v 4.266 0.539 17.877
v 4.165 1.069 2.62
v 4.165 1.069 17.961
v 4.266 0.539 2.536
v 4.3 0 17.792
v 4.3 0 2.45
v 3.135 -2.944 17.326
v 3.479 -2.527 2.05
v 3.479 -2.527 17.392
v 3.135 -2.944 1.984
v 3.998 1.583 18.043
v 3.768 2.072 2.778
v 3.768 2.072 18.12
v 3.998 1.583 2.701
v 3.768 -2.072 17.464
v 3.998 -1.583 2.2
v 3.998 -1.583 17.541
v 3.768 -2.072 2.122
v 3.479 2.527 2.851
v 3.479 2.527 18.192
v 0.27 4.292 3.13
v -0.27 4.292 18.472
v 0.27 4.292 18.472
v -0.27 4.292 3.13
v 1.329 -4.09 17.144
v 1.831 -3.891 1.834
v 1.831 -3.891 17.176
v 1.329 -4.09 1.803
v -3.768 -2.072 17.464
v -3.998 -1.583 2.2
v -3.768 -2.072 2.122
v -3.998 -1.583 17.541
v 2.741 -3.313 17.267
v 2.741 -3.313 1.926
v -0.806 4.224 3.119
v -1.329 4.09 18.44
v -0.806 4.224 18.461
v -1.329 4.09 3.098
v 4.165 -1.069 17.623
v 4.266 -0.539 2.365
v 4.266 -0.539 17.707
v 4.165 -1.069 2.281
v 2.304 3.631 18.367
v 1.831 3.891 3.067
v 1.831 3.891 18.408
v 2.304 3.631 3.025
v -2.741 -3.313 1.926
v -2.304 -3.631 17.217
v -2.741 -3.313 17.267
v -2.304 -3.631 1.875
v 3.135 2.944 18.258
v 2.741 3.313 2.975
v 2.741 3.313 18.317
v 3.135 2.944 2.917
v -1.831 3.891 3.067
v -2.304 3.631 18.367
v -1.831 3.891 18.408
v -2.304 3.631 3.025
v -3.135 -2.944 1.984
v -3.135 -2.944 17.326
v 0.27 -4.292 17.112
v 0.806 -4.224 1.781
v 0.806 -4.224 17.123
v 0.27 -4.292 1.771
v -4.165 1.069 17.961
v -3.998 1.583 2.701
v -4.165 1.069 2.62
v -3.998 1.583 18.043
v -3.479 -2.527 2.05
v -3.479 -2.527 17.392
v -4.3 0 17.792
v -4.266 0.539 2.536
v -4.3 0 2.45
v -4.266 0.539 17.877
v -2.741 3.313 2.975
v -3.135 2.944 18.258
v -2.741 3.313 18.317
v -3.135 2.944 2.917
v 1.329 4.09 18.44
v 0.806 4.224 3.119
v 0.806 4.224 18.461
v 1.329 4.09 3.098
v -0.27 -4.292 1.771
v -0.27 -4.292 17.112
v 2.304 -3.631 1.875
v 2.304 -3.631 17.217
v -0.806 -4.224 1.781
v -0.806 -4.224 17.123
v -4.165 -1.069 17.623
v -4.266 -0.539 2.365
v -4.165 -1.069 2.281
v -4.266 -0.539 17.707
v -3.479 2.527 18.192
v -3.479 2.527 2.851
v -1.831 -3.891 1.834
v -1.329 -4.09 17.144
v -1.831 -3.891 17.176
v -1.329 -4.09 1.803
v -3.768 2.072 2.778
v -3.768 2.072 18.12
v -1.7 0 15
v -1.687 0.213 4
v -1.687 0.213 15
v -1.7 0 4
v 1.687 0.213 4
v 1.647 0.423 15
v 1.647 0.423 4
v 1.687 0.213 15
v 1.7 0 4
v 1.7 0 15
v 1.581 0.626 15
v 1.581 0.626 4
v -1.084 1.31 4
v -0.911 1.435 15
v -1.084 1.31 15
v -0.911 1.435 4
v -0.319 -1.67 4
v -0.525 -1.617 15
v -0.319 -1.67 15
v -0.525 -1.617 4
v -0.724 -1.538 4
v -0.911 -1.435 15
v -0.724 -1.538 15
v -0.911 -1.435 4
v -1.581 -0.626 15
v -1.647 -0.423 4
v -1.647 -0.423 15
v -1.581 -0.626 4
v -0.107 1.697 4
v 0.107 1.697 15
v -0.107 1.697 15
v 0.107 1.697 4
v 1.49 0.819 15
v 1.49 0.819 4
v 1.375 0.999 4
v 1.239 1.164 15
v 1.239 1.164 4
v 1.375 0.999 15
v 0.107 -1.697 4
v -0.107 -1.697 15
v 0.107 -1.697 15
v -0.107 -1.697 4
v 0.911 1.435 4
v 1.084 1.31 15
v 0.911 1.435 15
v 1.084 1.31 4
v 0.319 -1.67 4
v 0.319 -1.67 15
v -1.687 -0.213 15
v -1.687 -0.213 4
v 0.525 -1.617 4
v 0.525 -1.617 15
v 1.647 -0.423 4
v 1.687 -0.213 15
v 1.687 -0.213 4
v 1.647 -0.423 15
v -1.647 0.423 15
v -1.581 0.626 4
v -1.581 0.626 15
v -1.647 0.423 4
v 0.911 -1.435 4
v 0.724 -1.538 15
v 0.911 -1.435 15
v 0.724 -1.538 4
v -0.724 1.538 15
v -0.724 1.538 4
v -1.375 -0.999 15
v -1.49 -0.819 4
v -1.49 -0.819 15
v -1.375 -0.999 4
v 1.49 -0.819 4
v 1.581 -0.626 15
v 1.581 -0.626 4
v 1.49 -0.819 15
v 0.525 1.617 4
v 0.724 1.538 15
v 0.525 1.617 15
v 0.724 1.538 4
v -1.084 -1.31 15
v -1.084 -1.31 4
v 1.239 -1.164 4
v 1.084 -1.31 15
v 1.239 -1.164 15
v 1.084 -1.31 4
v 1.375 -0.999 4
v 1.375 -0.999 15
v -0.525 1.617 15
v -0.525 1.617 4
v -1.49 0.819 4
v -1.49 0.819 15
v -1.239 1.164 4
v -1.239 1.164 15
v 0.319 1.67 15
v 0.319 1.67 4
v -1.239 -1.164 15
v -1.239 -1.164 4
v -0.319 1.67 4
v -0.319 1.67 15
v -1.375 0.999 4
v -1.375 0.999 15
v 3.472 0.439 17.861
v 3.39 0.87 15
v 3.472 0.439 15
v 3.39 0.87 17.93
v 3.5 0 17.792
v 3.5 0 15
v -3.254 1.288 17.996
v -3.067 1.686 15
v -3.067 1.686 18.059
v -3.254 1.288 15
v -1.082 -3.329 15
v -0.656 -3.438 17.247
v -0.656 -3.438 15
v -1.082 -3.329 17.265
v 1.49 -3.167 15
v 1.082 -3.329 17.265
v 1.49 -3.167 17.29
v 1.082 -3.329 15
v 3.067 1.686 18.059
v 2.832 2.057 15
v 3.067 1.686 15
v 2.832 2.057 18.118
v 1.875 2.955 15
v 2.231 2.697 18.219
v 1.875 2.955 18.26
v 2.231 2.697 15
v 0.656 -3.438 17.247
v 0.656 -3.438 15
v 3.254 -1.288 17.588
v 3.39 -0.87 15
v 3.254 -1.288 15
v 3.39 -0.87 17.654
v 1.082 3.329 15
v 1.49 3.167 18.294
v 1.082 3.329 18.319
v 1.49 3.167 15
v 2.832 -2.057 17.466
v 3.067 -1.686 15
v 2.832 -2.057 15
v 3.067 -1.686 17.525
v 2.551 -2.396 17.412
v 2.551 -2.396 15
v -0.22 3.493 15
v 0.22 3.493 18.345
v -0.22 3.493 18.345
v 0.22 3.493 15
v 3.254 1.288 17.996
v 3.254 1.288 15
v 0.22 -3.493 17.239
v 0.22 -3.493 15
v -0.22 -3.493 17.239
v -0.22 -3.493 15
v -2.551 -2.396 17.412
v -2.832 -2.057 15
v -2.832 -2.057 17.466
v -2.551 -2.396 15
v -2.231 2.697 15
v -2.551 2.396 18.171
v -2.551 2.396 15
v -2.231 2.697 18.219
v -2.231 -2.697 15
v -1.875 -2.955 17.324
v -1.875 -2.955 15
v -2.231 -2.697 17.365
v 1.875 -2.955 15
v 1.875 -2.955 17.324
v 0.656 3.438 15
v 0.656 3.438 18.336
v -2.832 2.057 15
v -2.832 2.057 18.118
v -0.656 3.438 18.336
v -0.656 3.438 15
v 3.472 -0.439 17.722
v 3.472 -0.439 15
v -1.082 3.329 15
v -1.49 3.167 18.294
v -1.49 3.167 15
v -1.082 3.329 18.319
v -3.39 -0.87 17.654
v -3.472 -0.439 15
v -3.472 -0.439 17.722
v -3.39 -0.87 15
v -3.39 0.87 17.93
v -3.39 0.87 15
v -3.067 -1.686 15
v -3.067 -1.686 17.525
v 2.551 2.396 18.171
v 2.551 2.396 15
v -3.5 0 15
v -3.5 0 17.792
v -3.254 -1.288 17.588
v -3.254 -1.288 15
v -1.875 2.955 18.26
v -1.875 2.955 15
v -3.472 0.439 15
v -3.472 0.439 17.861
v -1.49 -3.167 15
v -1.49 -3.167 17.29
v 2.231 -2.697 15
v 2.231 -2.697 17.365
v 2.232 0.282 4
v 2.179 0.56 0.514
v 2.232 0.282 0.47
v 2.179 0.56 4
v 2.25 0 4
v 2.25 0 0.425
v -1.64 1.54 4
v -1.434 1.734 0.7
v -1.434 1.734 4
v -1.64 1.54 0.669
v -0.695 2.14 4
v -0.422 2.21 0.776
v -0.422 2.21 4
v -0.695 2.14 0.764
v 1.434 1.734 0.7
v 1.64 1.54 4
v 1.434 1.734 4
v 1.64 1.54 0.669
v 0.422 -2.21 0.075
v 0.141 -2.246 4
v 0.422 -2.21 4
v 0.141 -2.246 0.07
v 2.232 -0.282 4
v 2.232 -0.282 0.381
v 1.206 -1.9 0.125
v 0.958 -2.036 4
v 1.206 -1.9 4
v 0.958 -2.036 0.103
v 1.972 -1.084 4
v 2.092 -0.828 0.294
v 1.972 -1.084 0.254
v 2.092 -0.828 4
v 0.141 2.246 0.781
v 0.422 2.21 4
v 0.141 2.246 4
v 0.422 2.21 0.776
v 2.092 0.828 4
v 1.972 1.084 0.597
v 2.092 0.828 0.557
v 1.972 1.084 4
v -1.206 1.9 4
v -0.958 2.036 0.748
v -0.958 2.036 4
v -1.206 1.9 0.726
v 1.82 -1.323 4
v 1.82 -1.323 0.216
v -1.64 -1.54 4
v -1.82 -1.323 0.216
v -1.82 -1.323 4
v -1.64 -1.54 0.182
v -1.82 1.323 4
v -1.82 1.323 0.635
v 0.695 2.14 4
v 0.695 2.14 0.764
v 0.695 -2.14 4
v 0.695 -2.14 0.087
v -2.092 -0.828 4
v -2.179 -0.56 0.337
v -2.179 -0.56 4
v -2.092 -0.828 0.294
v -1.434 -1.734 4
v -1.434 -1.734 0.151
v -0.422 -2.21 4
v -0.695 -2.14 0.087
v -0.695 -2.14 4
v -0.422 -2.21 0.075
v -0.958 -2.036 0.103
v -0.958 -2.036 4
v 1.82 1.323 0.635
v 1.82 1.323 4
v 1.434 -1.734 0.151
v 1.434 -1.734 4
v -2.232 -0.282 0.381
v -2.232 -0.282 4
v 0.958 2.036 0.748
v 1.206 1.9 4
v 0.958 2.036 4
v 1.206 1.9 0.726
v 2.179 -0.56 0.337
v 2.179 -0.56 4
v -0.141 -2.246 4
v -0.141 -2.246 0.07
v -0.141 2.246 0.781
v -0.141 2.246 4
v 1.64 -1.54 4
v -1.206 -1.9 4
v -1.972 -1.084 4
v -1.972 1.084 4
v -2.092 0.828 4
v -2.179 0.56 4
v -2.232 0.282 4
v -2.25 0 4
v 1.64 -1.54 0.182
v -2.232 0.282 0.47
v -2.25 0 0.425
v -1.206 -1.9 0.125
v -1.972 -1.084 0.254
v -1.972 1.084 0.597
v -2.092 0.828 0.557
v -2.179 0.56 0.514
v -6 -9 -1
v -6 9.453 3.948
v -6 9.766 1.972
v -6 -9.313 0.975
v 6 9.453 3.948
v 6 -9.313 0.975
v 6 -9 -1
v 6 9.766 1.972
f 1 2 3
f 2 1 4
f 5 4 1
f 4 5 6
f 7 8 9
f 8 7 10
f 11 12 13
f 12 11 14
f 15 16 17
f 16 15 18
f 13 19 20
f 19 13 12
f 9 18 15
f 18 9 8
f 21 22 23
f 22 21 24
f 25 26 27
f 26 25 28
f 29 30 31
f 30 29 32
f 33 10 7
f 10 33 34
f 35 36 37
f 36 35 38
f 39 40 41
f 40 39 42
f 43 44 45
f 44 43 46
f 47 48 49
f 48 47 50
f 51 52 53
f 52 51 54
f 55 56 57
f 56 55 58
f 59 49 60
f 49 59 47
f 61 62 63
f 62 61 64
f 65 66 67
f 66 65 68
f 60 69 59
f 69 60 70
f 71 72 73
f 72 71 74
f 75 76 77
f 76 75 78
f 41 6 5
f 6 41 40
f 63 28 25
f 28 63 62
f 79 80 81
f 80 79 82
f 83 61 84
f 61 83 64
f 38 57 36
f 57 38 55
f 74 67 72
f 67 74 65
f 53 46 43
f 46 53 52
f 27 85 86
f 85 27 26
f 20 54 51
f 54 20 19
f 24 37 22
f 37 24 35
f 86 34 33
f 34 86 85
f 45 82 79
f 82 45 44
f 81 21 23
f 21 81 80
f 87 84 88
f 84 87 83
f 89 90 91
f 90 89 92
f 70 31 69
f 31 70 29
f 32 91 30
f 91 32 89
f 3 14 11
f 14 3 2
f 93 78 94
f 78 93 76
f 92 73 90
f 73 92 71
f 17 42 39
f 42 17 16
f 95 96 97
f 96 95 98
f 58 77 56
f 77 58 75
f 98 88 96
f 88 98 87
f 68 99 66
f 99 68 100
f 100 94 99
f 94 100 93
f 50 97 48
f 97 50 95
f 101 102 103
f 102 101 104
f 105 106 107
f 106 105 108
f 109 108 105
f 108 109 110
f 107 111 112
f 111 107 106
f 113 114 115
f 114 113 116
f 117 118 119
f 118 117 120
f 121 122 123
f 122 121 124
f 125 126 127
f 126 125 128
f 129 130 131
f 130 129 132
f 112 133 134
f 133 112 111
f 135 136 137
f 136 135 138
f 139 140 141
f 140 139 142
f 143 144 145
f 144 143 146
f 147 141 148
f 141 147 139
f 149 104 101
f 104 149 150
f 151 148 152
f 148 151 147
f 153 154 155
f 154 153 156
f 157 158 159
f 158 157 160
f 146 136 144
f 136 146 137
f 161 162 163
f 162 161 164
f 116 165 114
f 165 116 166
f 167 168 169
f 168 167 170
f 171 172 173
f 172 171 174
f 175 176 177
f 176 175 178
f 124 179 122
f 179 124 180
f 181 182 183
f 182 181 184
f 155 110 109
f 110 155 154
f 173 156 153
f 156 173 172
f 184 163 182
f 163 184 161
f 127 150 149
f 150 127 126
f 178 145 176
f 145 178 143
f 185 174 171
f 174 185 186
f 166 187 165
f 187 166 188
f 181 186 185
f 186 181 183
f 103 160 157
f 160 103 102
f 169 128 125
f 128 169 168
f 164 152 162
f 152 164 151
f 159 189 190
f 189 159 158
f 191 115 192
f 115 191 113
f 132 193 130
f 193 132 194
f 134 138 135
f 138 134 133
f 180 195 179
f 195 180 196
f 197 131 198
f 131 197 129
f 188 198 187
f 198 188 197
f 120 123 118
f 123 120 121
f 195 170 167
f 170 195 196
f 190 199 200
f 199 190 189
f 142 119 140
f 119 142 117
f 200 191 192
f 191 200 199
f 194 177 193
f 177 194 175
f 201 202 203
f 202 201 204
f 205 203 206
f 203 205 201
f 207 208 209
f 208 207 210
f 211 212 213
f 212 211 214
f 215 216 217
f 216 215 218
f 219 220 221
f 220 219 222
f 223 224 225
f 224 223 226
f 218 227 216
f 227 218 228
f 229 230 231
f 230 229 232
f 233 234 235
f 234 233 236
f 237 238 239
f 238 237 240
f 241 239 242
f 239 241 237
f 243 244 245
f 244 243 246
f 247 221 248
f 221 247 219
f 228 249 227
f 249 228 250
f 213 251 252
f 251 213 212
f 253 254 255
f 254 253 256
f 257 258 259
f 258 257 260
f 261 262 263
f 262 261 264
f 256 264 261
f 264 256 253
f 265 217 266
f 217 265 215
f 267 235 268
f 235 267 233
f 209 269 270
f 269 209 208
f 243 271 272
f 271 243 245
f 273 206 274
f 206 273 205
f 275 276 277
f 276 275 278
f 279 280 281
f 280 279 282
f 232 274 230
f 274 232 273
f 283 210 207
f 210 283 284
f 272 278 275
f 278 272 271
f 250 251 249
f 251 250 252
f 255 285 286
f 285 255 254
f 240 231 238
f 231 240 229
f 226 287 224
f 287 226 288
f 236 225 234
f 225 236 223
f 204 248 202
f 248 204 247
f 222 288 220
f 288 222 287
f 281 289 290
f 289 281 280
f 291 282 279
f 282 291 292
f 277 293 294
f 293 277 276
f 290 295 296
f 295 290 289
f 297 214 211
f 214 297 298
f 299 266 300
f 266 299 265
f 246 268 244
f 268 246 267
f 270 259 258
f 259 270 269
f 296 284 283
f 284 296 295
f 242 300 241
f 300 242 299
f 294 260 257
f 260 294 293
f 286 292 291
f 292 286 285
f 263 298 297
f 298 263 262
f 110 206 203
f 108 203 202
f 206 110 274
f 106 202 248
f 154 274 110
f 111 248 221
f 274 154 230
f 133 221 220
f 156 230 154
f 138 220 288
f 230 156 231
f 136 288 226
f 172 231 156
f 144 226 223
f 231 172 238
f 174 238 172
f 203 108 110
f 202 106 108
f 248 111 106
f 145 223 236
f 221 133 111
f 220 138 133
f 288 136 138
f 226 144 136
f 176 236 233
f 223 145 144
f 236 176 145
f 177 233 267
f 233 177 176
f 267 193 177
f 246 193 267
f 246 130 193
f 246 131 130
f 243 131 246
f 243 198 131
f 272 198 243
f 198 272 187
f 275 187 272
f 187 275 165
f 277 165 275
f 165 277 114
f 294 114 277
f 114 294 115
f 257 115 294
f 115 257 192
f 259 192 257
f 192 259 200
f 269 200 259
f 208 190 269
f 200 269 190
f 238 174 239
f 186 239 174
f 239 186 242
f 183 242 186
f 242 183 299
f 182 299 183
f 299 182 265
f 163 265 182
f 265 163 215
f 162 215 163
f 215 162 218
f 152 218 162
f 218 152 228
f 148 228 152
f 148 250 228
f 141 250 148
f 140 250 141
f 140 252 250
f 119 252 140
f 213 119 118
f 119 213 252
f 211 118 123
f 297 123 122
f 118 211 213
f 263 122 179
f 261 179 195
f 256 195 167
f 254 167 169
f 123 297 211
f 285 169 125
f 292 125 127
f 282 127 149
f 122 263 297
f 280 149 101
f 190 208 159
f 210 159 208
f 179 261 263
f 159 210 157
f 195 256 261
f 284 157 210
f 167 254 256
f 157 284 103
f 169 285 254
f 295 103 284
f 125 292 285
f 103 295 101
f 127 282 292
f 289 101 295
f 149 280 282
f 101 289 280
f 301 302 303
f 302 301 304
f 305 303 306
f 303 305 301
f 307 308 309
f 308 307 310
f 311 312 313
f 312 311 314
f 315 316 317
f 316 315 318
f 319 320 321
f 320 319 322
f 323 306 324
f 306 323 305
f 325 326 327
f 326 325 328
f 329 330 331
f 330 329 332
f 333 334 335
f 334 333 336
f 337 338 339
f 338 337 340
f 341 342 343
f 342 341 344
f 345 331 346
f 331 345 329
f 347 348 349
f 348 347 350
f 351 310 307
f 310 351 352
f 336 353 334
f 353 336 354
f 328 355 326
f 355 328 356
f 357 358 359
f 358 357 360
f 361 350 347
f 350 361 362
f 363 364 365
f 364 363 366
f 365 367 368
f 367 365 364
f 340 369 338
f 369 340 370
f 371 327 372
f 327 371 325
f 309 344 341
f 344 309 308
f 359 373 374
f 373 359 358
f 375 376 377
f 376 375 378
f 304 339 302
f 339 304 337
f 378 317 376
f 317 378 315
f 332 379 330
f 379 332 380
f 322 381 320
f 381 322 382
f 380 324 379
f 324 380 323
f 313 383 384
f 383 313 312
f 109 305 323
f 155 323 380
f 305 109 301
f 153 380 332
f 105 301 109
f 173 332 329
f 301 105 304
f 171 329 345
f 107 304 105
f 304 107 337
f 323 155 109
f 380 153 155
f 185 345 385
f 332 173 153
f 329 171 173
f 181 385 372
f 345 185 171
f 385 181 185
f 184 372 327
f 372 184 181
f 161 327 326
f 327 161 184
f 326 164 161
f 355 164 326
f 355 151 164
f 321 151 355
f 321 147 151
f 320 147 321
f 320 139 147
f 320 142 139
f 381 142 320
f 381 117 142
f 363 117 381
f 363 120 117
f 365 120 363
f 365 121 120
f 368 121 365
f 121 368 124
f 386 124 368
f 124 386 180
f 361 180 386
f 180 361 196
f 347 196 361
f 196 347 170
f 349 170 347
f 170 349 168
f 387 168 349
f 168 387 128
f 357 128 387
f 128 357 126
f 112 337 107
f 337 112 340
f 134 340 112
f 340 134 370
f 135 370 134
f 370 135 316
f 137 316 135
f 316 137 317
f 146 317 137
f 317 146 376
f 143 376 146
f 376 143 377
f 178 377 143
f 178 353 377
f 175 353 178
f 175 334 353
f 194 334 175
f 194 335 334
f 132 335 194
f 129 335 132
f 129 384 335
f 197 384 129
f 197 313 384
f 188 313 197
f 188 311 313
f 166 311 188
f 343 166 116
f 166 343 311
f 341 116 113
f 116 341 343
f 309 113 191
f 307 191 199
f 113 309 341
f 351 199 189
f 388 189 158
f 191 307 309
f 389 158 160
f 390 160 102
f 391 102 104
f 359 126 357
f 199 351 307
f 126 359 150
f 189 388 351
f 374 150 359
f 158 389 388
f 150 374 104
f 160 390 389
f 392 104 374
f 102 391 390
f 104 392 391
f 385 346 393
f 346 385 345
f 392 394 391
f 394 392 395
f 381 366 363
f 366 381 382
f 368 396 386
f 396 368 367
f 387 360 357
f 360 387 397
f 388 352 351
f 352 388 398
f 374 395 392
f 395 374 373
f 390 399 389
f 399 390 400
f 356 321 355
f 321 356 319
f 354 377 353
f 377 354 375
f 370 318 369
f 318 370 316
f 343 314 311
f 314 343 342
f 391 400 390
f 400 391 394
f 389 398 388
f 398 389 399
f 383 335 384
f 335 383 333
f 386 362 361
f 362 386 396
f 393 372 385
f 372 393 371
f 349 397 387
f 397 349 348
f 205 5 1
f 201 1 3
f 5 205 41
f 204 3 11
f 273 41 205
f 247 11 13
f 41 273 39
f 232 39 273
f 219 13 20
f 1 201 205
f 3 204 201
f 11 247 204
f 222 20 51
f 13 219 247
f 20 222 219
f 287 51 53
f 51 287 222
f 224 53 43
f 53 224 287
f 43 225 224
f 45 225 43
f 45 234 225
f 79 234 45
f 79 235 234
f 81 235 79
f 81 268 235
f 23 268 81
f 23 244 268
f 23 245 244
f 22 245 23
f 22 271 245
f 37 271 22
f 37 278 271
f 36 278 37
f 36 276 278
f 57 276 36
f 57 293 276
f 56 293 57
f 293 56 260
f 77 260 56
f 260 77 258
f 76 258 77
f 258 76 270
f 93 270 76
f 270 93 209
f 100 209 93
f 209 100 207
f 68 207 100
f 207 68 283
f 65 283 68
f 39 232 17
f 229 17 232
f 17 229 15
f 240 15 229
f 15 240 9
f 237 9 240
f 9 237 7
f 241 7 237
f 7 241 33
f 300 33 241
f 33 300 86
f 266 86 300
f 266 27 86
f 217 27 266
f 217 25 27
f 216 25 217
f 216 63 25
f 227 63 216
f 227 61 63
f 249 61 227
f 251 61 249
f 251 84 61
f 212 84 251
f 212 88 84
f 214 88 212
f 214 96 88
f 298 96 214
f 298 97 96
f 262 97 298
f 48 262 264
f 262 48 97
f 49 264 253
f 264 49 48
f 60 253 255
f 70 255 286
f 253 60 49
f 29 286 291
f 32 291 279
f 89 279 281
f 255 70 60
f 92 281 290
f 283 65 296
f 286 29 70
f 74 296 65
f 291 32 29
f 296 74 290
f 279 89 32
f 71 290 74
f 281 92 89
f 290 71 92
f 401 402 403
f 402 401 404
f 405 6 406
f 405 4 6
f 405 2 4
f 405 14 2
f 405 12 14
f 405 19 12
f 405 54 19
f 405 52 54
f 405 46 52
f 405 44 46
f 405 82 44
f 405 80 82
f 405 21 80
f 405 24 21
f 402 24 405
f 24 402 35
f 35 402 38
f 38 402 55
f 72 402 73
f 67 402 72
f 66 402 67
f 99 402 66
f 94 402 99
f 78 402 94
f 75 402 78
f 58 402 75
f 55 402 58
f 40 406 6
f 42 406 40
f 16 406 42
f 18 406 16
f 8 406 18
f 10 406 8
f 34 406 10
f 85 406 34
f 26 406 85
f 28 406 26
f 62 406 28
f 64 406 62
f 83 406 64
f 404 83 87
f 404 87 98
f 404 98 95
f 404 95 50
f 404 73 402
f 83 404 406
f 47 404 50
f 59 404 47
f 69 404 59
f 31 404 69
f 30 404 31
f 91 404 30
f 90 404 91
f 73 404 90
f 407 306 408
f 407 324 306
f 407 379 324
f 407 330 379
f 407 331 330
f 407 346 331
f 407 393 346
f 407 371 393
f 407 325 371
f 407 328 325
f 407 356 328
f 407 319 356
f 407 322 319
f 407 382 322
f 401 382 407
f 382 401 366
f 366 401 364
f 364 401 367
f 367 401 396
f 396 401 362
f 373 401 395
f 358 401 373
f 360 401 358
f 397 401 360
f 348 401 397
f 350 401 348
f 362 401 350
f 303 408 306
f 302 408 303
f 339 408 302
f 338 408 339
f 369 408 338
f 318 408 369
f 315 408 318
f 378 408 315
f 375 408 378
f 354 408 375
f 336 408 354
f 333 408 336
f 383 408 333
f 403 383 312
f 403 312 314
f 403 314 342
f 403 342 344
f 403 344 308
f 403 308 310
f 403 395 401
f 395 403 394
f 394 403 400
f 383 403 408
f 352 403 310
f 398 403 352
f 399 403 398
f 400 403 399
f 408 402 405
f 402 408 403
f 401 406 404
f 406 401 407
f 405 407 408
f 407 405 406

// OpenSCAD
$fa = 1;
$fs = 0.5;
$fn = 50;

keyangle=9;
screwr=1.7;
mountr=2.25;

module post() {
  difference() {
    translate([0,0,-2])cylinder(h=22, r=4.3);
    translate([0,0,-2.5]) cylinder(h=21, r=screwr);
    translate([0,0,15]) cylinder(h=6, r=3.5);
    translate([0,0,-1]) cylinder(h=5, r=mountr);
  }
}

union() {
  difference() {
    post();
    translate([-6,-6,-5]) rotate([keyangle,0,0]) cube([12,12,5]);
    translate([-5,-5,17]) rotate([keyangle,0,0]) cube([10,10,5]);
  }
  difference() {
    translate([-6,-9,-1]) rotate([keyangle,0,0]) cube([12,19,2]);
    translate([0,0,-2.5]) cylinder(h=21, r=screwr);
    translate([0,0,-1]) cylinder(h=5, r=mountr);
  }
}
